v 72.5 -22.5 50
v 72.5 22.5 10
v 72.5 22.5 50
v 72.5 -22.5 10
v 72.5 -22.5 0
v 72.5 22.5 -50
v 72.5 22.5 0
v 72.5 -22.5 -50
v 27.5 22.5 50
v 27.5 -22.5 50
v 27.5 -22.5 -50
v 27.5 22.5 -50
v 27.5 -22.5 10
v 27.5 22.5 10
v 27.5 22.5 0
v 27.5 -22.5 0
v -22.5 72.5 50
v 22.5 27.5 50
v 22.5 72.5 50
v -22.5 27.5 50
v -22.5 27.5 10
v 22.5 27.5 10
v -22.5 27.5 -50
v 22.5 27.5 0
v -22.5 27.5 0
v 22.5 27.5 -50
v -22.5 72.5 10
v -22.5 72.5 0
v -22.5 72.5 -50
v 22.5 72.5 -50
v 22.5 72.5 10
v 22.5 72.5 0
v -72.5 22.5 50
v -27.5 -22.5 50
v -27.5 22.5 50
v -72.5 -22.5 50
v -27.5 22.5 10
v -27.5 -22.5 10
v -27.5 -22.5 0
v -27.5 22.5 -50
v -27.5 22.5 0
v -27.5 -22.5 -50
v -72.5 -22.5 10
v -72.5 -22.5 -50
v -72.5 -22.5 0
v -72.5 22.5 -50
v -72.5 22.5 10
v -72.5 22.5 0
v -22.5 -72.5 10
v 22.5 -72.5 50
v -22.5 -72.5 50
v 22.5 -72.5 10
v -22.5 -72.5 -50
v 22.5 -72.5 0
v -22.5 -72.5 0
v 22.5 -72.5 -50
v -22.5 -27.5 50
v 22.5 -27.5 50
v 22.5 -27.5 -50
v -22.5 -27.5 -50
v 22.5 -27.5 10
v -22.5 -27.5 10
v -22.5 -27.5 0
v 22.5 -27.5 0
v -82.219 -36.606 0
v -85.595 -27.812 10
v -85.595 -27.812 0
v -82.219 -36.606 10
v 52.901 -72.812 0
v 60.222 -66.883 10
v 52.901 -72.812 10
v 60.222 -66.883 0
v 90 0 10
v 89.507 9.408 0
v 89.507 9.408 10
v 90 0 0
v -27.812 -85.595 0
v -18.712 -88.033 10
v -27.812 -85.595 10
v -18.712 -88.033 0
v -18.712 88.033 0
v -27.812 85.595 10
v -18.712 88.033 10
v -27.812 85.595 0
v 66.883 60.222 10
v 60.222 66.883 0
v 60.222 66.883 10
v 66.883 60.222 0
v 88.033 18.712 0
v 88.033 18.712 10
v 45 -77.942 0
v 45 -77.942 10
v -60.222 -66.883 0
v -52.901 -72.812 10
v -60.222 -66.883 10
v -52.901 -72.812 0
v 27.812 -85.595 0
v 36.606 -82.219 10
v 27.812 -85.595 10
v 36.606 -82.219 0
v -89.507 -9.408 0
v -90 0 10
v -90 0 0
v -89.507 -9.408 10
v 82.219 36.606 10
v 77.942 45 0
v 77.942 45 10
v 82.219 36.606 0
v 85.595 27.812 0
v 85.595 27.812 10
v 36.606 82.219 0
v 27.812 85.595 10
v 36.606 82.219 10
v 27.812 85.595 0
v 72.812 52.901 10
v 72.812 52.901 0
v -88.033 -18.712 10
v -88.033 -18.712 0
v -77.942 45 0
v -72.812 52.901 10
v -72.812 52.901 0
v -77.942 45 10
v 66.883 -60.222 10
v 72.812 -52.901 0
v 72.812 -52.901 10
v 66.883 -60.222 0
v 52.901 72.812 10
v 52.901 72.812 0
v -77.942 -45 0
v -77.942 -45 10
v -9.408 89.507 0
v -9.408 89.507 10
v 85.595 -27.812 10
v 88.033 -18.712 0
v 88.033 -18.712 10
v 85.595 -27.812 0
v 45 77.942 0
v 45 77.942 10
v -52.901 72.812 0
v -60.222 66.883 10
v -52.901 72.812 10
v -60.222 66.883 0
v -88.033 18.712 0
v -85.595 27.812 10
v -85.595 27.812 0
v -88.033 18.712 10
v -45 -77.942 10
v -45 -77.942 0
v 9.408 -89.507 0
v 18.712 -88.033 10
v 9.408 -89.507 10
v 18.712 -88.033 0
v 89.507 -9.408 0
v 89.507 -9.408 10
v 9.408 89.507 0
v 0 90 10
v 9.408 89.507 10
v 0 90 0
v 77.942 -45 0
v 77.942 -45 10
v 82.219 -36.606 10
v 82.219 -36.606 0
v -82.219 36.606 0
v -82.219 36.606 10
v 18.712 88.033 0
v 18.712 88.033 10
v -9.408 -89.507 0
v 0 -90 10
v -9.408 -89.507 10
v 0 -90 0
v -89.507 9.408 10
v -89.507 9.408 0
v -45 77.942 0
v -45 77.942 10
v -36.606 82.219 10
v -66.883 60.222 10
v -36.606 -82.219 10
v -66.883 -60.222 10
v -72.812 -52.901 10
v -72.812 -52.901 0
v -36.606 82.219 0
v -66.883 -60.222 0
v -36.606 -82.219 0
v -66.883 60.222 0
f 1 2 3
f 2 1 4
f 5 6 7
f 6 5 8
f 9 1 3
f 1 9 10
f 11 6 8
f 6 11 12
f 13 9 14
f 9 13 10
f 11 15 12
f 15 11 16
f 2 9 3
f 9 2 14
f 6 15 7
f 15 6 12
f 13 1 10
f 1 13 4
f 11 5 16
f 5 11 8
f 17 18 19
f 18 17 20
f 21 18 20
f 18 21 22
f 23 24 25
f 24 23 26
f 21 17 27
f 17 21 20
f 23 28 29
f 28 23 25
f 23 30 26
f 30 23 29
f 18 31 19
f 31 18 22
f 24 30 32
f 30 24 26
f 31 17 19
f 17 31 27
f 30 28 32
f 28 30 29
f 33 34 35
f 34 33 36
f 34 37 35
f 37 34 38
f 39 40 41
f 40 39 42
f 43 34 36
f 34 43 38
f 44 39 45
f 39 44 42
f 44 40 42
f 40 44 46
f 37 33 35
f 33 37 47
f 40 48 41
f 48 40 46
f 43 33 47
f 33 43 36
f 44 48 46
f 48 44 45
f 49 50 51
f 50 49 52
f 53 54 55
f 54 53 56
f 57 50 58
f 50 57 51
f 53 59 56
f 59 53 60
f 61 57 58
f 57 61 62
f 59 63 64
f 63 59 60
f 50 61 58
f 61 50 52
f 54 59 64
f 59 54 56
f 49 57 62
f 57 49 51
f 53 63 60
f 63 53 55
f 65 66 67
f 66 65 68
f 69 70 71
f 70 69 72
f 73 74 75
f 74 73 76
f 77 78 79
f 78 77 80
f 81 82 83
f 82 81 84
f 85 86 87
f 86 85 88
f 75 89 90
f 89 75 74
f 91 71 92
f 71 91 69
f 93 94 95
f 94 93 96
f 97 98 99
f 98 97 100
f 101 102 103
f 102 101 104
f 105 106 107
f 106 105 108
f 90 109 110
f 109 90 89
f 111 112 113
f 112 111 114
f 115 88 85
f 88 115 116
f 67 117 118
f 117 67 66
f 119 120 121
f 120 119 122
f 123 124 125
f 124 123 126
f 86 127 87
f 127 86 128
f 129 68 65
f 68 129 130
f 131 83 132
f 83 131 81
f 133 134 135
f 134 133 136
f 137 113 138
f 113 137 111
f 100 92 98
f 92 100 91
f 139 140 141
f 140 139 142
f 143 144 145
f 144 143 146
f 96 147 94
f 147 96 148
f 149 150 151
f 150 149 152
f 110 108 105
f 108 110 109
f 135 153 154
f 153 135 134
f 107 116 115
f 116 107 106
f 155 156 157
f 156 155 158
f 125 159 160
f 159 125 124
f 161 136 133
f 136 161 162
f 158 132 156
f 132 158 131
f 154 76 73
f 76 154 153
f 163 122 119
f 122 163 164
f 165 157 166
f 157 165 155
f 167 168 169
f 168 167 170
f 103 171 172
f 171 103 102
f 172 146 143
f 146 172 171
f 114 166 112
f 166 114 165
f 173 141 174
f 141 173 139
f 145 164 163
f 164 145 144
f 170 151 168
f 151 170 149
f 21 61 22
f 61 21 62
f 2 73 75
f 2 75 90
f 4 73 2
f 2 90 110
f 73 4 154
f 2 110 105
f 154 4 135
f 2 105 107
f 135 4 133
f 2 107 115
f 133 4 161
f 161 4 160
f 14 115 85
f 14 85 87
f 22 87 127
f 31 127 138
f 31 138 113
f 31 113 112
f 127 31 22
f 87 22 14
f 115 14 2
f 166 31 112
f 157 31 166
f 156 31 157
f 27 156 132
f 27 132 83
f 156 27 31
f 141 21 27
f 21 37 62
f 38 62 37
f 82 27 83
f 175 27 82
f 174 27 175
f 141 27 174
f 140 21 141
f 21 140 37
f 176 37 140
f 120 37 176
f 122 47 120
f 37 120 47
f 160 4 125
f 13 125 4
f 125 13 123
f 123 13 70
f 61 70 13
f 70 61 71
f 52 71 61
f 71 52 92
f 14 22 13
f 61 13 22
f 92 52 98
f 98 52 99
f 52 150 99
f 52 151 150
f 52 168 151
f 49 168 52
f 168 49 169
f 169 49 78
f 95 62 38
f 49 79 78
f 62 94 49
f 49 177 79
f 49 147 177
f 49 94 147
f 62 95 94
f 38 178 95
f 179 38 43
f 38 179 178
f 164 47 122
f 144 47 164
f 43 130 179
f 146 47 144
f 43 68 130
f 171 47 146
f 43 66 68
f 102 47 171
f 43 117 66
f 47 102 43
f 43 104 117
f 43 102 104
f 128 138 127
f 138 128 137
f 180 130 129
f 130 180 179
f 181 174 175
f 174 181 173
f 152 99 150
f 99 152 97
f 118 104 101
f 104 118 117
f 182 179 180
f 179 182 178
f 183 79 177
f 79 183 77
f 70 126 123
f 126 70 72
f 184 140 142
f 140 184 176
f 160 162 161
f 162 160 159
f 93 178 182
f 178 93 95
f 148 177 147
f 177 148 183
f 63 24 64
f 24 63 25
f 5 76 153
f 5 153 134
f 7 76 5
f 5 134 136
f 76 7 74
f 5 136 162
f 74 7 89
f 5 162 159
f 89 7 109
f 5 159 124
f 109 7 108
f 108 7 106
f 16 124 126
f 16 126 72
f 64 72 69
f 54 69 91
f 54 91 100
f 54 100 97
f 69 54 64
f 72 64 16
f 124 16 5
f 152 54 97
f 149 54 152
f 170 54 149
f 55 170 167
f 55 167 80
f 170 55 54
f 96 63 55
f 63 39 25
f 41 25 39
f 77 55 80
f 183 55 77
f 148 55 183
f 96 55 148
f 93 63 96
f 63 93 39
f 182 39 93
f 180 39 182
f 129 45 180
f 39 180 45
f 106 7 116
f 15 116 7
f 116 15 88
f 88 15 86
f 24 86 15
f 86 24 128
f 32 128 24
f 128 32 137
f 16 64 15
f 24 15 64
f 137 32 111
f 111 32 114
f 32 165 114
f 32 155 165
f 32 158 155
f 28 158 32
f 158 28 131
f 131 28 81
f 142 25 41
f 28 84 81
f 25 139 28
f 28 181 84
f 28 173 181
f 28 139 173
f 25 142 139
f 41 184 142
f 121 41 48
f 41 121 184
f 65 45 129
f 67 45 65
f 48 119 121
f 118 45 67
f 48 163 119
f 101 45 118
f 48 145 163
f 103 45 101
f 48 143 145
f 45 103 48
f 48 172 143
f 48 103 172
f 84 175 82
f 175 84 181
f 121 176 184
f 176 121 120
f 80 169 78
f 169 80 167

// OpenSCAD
/**
 * Spice Jar Width: 45 mm
 * Spice Jar Height: 100 mm
 */


$fn=60;



// Spice Jar
for (p = [0:90:360]) {
    rotate([0,0,p]) translate([50,0,0]) cube([45, 45, 100], true);
}

cylinder(r=90,h=10);
